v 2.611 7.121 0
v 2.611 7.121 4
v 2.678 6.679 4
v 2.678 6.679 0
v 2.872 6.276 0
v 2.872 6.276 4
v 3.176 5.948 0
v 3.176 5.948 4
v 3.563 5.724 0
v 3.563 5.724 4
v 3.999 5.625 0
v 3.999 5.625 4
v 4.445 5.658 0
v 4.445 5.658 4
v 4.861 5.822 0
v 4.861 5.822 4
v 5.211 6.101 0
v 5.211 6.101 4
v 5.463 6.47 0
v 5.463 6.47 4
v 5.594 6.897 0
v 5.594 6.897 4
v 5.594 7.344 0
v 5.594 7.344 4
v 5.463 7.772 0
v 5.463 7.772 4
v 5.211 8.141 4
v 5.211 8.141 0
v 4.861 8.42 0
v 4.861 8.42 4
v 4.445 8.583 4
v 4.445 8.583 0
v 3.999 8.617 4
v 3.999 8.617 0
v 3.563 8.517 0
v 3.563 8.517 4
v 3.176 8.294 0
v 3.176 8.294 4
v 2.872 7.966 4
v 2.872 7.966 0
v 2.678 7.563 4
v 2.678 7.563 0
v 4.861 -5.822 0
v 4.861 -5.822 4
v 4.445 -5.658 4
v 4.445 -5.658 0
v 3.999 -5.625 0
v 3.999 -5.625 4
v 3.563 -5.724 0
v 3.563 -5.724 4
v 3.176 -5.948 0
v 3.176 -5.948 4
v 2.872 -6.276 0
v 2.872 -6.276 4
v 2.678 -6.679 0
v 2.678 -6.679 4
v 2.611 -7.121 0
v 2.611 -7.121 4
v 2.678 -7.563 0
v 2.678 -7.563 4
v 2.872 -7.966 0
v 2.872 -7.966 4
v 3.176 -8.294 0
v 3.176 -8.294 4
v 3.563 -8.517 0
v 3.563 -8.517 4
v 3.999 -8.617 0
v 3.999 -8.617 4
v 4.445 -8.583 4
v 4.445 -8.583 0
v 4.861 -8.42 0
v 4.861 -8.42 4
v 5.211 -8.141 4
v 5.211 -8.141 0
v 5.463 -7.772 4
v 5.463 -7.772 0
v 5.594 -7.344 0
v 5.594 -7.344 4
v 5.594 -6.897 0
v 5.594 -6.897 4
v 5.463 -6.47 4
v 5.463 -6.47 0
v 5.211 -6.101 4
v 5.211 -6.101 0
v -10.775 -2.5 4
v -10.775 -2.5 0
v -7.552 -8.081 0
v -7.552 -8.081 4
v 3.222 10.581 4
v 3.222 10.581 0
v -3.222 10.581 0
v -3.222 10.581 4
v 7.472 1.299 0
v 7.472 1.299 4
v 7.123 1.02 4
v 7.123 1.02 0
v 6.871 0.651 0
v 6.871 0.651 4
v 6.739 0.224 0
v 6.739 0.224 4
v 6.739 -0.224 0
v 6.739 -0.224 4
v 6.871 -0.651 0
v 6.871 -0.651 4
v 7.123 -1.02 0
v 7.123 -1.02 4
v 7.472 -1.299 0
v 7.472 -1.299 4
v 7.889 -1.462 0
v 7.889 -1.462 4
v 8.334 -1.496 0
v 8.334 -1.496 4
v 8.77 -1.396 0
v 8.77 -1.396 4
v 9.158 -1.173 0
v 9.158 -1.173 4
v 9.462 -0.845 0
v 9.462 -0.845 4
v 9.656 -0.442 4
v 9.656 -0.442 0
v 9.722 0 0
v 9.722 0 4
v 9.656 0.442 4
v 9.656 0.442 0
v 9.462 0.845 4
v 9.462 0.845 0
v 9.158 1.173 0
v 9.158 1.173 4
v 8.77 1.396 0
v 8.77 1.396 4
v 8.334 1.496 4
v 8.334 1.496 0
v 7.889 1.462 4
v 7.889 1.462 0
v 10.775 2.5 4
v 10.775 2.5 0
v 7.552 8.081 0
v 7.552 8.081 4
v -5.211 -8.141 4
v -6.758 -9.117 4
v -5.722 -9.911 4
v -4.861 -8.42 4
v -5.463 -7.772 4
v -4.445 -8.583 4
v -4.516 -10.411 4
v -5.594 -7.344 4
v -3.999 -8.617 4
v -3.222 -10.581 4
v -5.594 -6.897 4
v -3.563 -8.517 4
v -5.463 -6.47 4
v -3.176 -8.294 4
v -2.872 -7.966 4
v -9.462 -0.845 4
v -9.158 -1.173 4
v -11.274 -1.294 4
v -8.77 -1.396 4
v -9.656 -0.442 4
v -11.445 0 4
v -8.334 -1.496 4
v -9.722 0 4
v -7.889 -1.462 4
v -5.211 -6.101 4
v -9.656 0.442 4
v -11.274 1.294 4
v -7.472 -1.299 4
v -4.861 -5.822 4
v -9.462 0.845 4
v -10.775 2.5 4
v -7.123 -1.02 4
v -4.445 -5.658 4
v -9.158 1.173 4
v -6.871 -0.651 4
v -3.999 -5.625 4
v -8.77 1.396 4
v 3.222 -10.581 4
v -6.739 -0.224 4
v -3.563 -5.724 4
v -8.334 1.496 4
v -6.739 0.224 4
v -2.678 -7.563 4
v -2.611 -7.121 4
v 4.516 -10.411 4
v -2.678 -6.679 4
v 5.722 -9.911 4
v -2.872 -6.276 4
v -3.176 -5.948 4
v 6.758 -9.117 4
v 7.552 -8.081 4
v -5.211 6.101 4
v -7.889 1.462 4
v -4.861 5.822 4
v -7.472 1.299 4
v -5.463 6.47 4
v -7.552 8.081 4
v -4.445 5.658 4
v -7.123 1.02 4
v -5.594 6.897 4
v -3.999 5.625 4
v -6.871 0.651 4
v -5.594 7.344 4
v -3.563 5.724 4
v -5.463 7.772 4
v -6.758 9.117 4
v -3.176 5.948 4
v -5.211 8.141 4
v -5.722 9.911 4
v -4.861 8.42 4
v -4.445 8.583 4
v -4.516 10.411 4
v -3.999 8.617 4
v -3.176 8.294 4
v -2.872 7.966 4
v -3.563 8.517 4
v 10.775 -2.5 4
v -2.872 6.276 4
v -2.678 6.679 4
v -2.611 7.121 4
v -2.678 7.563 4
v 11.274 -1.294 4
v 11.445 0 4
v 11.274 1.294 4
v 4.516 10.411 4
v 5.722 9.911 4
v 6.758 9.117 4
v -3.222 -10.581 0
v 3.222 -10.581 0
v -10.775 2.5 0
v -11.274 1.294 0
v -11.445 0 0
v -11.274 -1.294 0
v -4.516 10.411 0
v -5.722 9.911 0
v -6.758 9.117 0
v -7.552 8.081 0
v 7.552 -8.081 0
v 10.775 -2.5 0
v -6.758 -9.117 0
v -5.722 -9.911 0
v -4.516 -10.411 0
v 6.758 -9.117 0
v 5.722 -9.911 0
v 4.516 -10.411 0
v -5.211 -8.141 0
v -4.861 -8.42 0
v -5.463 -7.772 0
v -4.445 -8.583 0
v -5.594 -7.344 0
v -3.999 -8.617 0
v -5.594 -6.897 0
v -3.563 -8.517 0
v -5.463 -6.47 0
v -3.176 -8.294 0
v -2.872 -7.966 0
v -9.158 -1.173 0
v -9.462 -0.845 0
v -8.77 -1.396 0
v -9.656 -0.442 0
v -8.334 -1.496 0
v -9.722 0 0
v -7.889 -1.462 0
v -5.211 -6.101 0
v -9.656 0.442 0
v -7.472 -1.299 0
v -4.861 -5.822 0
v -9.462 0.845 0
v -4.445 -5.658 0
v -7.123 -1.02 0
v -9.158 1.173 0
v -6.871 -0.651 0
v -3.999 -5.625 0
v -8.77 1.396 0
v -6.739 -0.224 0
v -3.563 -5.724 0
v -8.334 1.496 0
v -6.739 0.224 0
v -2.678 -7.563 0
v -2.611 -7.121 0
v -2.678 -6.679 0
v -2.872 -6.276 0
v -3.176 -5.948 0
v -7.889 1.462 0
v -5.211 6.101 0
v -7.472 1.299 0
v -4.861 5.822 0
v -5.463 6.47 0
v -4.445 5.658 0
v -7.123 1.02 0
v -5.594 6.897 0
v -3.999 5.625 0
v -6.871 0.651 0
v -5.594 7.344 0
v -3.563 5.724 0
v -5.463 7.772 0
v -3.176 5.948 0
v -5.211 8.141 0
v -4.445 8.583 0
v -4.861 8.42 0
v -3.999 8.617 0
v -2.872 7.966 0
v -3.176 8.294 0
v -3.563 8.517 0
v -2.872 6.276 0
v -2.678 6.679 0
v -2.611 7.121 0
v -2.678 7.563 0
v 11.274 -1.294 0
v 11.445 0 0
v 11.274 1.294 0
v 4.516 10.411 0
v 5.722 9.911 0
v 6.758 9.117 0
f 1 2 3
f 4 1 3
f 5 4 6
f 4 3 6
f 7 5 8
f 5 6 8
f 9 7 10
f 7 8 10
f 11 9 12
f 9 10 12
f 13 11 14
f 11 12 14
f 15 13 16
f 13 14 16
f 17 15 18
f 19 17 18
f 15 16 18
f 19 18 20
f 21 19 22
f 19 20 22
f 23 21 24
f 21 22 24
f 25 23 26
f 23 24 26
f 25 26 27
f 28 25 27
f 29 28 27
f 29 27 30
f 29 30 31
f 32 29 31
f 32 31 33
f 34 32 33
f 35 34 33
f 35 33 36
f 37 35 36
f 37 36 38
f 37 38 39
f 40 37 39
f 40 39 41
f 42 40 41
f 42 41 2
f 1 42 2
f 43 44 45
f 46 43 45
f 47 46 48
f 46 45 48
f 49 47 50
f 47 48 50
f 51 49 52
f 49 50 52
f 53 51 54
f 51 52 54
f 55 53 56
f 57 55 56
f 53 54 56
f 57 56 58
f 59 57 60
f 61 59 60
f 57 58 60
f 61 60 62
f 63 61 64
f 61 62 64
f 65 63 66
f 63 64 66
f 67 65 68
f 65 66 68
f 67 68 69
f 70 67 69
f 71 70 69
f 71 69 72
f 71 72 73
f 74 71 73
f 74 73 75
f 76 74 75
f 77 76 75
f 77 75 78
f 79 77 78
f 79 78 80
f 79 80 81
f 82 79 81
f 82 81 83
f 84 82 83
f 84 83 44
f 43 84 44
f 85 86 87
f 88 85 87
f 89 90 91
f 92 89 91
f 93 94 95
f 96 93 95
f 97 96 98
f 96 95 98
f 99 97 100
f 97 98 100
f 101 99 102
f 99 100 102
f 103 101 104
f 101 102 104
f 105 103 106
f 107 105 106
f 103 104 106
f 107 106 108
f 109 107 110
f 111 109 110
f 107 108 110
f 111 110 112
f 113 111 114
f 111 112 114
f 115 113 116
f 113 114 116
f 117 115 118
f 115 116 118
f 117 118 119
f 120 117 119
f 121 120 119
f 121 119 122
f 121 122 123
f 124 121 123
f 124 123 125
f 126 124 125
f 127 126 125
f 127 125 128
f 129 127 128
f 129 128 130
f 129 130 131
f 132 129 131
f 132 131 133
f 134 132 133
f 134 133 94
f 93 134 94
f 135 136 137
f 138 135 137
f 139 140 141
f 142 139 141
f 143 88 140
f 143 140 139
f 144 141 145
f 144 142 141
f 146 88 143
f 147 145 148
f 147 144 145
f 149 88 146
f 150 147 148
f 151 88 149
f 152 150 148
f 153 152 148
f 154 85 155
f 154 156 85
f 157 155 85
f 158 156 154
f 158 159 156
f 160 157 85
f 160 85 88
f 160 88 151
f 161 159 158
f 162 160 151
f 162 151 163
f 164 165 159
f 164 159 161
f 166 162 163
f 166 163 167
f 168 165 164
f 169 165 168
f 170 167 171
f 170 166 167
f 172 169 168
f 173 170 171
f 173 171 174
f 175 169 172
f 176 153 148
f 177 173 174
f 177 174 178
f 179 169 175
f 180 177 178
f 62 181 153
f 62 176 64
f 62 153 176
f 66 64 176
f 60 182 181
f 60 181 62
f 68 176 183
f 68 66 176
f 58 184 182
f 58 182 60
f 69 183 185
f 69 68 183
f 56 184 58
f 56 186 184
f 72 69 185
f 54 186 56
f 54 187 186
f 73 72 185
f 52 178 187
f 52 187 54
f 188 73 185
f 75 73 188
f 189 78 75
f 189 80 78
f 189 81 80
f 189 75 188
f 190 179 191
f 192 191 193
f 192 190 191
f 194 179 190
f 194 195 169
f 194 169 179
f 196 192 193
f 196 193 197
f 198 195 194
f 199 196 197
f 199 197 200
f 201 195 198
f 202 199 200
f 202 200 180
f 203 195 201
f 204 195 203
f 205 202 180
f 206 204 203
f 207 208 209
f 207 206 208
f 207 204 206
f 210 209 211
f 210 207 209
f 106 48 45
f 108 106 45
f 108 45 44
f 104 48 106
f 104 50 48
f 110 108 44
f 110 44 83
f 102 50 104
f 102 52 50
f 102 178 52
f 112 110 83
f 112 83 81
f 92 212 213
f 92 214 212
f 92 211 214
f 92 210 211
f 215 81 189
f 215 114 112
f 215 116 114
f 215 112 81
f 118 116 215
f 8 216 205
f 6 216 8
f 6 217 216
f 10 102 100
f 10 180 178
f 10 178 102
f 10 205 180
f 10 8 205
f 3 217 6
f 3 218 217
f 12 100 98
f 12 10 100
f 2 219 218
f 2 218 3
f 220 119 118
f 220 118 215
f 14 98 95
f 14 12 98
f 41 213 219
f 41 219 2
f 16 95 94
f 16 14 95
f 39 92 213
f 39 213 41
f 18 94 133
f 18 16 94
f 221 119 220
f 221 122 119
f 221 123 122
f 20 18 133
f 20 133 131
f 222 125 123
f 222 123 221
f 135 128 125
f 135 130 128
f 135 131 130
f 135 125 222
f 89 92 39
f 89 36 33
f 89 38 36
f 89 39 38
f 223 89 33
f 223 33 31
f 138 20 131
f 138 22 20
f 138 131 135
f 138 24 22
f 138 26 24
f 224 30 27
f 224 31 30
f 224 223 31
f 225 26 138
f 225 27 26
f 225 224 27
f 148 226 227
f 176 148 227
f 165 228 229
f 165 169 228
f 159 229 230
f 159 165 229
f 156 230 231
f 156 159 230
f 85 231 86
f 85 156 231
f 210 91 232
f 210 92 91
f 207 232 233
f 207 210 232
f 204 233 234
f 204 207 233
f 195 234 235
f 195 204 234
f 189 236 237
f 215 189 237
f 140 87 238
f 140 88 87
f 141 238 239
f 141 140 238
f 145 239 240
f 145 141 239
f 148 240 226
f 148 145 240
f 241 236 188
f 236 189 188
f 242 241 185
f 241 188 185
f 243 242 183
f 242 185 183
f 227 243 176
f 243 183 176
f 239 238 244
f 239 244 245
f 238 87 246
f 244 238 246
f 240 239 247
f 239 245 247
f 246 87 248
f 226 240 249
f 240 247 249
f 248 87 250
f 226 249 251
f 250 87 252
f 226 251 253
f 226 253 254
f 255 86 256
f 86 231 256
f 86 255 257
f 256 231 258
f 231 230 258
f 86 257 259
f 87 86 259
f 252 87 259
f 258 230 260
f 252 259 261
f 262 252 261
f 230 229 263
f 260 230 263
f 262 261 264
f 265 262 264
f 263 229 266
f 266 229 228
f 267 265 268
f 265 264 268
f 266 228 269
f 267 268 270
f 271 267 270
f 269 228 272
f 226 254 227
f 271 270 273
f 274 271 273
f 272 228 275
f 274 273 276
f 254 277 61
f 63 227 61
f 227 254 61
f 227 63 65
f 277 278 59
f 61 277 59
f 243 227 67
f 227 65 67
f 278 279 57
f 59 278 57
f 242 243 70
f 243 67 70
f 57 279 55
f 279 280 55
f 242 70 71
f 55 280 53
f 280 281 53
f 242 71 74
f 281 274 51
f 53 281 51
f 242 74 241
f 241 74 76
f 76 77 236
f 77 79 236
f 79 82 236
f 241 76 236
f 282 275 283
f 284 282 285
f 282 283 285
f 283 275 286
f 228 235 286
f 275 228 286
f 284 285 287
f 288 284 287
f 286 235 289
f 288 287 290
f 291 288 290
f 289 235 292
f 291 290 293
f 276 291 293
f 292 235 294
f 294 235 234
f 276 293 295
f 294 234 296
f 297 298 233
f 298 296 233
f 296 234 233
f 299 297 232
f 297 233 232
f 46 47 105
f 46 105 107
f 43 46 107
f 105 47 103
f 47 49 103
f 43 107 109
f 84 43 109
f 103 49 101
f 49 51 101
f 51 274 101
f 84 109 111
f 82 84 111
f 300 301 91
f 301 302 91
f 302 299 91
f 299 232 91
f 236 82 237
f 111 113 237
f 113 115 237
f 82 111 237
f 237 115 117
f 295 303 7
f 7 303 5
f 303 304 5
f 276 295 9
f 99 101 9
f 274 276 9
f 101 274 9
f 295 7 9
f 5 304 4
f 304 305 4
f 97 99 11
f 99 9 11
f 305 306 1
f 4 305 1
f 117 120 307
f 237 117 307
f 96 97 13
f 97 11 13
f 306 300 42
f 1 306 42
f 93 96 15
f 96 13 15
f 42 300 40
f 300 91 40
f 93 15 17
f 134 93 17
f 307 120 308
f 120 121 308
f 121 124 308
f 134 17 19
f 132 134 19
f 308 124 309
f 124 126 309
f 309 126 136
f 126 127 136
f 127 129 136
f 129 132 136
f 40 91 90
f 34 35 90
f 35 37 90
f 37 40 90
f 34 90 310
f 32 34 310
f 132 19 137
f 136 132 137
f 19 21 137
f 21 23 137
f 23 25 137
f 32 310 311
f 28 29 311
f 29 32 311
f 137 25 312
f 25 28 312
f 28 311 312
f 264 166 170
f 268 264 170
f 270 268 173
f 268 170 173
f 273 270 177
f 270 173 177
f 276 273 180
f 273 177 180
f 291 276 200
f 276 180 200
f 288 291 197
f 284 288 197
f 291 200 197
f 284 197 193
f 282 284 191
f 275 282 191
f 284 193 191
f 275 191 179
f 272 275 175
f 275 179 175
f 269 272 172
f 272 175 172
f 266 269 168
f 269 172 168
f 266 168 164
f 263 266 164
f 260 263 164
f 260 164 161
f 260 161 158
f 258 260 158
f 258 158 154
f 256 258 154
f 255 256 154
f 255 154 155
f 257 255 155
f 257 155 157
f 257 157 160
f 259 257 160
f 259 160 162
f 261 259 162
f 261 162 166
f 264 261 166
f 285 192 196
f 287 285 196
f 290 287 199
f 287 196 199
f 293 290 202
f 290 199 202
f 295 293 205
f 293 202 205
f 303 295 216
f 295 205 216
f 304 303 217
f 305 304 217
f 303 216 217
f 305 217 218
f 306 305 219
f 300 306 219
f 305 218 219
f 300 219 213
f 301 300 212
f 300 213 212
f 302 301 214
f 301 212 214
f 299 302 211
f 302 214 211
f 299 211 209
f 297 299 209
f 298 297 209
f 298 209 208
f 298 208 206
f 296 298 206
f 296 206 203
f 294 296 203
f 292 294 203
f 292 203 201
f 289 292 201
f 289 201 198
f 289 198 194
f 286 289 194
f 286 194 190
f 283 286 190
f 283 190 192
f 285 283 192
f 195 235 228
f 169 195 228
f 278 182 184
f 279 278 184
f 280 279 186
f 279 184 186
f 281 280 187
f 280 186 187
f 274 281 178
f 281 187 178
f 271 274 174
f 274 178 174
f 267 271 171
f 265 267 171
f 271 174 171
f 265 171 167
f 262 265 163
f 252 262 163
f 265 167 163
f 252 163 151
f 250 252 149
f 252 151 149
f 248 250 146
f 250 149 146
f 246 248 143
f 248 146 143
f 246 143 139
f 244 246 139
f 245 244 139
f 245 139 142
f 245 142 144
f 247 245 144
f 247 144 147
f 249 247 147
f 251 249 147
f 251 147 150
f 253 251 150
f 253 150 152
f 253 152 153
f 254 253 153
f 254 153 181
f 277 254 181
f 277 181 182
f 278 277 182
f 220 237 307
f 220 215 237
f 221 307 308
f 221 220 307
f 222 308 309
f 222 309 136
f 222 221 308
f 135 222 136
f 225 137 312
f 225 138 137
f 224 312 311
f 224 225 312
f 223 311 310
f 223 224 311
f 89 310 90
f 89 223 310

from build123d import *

# Parameters (mm, degrees)
BOSS_EXTRUDE1_DEPTH = 4
FILLET1_R           = 5
SKETCH2_R           = 1.5
CUT_EXTRUDE1_DEPTH  = 17.091809531
CIRPATTERN1_COUNT   = 6


with BuildPart() as part:
    # Sketch1 → Boss-Extrude1 (new body)
    with BuildSketch(Plane.XY):
        Polygon((6.109123402, -10.581312122), (12.218246804, 0), (6.109123402, 10.581312122), (-6.109123402, 10.581312122), (-12.218246804, 0), (-6.109123402, -10.581312122), align=None)
    extrude(amount=BOSS_EXTRUDE1_DEPTH)

    # Fillet1
    fillet1_edges = [part.edges().sort_by_distance(p)[0] for p in [
        (6.109123402, -10.581312122, 2),
        (-6.109123402, -10.581312122, 2),
        (-12.218246804, 0, 2),
        (12.218246804, 0, 2),
        (6.109123402, 10.581312122, 2),
        (-6.109123402, 10.581312122, 2),
    ]]
    fillet(fillet1_edges, radius=FILLET1_R)

    # Sketch2 → Cut-Extrude1 (cut, through all)
    with BuildSketch(Plane.XY.offset(4)):
        with Locations((-4.111186028, -7.12078308)):
            Circle(SKETCH2_R)
    cut_extrude1 = extrude(amount=-CUT_EXTRUDE1_DEPTH, mode=Mode.SUBTRACT)

    # CirPattern1: Cut-Extrude1 ×6 about axis
    cirpattern1_axis = Axis((0, 0, -80.9), (0, 0, 1))
    for i in range(1, CIRPATTERN1_COUNT):
        add(cut_extrude1.rotate(cirpattern1_axis, i * 360 / CIRPATTERN1_COUNT), mode=Mode.SUBTRACT)


solid = part.part
